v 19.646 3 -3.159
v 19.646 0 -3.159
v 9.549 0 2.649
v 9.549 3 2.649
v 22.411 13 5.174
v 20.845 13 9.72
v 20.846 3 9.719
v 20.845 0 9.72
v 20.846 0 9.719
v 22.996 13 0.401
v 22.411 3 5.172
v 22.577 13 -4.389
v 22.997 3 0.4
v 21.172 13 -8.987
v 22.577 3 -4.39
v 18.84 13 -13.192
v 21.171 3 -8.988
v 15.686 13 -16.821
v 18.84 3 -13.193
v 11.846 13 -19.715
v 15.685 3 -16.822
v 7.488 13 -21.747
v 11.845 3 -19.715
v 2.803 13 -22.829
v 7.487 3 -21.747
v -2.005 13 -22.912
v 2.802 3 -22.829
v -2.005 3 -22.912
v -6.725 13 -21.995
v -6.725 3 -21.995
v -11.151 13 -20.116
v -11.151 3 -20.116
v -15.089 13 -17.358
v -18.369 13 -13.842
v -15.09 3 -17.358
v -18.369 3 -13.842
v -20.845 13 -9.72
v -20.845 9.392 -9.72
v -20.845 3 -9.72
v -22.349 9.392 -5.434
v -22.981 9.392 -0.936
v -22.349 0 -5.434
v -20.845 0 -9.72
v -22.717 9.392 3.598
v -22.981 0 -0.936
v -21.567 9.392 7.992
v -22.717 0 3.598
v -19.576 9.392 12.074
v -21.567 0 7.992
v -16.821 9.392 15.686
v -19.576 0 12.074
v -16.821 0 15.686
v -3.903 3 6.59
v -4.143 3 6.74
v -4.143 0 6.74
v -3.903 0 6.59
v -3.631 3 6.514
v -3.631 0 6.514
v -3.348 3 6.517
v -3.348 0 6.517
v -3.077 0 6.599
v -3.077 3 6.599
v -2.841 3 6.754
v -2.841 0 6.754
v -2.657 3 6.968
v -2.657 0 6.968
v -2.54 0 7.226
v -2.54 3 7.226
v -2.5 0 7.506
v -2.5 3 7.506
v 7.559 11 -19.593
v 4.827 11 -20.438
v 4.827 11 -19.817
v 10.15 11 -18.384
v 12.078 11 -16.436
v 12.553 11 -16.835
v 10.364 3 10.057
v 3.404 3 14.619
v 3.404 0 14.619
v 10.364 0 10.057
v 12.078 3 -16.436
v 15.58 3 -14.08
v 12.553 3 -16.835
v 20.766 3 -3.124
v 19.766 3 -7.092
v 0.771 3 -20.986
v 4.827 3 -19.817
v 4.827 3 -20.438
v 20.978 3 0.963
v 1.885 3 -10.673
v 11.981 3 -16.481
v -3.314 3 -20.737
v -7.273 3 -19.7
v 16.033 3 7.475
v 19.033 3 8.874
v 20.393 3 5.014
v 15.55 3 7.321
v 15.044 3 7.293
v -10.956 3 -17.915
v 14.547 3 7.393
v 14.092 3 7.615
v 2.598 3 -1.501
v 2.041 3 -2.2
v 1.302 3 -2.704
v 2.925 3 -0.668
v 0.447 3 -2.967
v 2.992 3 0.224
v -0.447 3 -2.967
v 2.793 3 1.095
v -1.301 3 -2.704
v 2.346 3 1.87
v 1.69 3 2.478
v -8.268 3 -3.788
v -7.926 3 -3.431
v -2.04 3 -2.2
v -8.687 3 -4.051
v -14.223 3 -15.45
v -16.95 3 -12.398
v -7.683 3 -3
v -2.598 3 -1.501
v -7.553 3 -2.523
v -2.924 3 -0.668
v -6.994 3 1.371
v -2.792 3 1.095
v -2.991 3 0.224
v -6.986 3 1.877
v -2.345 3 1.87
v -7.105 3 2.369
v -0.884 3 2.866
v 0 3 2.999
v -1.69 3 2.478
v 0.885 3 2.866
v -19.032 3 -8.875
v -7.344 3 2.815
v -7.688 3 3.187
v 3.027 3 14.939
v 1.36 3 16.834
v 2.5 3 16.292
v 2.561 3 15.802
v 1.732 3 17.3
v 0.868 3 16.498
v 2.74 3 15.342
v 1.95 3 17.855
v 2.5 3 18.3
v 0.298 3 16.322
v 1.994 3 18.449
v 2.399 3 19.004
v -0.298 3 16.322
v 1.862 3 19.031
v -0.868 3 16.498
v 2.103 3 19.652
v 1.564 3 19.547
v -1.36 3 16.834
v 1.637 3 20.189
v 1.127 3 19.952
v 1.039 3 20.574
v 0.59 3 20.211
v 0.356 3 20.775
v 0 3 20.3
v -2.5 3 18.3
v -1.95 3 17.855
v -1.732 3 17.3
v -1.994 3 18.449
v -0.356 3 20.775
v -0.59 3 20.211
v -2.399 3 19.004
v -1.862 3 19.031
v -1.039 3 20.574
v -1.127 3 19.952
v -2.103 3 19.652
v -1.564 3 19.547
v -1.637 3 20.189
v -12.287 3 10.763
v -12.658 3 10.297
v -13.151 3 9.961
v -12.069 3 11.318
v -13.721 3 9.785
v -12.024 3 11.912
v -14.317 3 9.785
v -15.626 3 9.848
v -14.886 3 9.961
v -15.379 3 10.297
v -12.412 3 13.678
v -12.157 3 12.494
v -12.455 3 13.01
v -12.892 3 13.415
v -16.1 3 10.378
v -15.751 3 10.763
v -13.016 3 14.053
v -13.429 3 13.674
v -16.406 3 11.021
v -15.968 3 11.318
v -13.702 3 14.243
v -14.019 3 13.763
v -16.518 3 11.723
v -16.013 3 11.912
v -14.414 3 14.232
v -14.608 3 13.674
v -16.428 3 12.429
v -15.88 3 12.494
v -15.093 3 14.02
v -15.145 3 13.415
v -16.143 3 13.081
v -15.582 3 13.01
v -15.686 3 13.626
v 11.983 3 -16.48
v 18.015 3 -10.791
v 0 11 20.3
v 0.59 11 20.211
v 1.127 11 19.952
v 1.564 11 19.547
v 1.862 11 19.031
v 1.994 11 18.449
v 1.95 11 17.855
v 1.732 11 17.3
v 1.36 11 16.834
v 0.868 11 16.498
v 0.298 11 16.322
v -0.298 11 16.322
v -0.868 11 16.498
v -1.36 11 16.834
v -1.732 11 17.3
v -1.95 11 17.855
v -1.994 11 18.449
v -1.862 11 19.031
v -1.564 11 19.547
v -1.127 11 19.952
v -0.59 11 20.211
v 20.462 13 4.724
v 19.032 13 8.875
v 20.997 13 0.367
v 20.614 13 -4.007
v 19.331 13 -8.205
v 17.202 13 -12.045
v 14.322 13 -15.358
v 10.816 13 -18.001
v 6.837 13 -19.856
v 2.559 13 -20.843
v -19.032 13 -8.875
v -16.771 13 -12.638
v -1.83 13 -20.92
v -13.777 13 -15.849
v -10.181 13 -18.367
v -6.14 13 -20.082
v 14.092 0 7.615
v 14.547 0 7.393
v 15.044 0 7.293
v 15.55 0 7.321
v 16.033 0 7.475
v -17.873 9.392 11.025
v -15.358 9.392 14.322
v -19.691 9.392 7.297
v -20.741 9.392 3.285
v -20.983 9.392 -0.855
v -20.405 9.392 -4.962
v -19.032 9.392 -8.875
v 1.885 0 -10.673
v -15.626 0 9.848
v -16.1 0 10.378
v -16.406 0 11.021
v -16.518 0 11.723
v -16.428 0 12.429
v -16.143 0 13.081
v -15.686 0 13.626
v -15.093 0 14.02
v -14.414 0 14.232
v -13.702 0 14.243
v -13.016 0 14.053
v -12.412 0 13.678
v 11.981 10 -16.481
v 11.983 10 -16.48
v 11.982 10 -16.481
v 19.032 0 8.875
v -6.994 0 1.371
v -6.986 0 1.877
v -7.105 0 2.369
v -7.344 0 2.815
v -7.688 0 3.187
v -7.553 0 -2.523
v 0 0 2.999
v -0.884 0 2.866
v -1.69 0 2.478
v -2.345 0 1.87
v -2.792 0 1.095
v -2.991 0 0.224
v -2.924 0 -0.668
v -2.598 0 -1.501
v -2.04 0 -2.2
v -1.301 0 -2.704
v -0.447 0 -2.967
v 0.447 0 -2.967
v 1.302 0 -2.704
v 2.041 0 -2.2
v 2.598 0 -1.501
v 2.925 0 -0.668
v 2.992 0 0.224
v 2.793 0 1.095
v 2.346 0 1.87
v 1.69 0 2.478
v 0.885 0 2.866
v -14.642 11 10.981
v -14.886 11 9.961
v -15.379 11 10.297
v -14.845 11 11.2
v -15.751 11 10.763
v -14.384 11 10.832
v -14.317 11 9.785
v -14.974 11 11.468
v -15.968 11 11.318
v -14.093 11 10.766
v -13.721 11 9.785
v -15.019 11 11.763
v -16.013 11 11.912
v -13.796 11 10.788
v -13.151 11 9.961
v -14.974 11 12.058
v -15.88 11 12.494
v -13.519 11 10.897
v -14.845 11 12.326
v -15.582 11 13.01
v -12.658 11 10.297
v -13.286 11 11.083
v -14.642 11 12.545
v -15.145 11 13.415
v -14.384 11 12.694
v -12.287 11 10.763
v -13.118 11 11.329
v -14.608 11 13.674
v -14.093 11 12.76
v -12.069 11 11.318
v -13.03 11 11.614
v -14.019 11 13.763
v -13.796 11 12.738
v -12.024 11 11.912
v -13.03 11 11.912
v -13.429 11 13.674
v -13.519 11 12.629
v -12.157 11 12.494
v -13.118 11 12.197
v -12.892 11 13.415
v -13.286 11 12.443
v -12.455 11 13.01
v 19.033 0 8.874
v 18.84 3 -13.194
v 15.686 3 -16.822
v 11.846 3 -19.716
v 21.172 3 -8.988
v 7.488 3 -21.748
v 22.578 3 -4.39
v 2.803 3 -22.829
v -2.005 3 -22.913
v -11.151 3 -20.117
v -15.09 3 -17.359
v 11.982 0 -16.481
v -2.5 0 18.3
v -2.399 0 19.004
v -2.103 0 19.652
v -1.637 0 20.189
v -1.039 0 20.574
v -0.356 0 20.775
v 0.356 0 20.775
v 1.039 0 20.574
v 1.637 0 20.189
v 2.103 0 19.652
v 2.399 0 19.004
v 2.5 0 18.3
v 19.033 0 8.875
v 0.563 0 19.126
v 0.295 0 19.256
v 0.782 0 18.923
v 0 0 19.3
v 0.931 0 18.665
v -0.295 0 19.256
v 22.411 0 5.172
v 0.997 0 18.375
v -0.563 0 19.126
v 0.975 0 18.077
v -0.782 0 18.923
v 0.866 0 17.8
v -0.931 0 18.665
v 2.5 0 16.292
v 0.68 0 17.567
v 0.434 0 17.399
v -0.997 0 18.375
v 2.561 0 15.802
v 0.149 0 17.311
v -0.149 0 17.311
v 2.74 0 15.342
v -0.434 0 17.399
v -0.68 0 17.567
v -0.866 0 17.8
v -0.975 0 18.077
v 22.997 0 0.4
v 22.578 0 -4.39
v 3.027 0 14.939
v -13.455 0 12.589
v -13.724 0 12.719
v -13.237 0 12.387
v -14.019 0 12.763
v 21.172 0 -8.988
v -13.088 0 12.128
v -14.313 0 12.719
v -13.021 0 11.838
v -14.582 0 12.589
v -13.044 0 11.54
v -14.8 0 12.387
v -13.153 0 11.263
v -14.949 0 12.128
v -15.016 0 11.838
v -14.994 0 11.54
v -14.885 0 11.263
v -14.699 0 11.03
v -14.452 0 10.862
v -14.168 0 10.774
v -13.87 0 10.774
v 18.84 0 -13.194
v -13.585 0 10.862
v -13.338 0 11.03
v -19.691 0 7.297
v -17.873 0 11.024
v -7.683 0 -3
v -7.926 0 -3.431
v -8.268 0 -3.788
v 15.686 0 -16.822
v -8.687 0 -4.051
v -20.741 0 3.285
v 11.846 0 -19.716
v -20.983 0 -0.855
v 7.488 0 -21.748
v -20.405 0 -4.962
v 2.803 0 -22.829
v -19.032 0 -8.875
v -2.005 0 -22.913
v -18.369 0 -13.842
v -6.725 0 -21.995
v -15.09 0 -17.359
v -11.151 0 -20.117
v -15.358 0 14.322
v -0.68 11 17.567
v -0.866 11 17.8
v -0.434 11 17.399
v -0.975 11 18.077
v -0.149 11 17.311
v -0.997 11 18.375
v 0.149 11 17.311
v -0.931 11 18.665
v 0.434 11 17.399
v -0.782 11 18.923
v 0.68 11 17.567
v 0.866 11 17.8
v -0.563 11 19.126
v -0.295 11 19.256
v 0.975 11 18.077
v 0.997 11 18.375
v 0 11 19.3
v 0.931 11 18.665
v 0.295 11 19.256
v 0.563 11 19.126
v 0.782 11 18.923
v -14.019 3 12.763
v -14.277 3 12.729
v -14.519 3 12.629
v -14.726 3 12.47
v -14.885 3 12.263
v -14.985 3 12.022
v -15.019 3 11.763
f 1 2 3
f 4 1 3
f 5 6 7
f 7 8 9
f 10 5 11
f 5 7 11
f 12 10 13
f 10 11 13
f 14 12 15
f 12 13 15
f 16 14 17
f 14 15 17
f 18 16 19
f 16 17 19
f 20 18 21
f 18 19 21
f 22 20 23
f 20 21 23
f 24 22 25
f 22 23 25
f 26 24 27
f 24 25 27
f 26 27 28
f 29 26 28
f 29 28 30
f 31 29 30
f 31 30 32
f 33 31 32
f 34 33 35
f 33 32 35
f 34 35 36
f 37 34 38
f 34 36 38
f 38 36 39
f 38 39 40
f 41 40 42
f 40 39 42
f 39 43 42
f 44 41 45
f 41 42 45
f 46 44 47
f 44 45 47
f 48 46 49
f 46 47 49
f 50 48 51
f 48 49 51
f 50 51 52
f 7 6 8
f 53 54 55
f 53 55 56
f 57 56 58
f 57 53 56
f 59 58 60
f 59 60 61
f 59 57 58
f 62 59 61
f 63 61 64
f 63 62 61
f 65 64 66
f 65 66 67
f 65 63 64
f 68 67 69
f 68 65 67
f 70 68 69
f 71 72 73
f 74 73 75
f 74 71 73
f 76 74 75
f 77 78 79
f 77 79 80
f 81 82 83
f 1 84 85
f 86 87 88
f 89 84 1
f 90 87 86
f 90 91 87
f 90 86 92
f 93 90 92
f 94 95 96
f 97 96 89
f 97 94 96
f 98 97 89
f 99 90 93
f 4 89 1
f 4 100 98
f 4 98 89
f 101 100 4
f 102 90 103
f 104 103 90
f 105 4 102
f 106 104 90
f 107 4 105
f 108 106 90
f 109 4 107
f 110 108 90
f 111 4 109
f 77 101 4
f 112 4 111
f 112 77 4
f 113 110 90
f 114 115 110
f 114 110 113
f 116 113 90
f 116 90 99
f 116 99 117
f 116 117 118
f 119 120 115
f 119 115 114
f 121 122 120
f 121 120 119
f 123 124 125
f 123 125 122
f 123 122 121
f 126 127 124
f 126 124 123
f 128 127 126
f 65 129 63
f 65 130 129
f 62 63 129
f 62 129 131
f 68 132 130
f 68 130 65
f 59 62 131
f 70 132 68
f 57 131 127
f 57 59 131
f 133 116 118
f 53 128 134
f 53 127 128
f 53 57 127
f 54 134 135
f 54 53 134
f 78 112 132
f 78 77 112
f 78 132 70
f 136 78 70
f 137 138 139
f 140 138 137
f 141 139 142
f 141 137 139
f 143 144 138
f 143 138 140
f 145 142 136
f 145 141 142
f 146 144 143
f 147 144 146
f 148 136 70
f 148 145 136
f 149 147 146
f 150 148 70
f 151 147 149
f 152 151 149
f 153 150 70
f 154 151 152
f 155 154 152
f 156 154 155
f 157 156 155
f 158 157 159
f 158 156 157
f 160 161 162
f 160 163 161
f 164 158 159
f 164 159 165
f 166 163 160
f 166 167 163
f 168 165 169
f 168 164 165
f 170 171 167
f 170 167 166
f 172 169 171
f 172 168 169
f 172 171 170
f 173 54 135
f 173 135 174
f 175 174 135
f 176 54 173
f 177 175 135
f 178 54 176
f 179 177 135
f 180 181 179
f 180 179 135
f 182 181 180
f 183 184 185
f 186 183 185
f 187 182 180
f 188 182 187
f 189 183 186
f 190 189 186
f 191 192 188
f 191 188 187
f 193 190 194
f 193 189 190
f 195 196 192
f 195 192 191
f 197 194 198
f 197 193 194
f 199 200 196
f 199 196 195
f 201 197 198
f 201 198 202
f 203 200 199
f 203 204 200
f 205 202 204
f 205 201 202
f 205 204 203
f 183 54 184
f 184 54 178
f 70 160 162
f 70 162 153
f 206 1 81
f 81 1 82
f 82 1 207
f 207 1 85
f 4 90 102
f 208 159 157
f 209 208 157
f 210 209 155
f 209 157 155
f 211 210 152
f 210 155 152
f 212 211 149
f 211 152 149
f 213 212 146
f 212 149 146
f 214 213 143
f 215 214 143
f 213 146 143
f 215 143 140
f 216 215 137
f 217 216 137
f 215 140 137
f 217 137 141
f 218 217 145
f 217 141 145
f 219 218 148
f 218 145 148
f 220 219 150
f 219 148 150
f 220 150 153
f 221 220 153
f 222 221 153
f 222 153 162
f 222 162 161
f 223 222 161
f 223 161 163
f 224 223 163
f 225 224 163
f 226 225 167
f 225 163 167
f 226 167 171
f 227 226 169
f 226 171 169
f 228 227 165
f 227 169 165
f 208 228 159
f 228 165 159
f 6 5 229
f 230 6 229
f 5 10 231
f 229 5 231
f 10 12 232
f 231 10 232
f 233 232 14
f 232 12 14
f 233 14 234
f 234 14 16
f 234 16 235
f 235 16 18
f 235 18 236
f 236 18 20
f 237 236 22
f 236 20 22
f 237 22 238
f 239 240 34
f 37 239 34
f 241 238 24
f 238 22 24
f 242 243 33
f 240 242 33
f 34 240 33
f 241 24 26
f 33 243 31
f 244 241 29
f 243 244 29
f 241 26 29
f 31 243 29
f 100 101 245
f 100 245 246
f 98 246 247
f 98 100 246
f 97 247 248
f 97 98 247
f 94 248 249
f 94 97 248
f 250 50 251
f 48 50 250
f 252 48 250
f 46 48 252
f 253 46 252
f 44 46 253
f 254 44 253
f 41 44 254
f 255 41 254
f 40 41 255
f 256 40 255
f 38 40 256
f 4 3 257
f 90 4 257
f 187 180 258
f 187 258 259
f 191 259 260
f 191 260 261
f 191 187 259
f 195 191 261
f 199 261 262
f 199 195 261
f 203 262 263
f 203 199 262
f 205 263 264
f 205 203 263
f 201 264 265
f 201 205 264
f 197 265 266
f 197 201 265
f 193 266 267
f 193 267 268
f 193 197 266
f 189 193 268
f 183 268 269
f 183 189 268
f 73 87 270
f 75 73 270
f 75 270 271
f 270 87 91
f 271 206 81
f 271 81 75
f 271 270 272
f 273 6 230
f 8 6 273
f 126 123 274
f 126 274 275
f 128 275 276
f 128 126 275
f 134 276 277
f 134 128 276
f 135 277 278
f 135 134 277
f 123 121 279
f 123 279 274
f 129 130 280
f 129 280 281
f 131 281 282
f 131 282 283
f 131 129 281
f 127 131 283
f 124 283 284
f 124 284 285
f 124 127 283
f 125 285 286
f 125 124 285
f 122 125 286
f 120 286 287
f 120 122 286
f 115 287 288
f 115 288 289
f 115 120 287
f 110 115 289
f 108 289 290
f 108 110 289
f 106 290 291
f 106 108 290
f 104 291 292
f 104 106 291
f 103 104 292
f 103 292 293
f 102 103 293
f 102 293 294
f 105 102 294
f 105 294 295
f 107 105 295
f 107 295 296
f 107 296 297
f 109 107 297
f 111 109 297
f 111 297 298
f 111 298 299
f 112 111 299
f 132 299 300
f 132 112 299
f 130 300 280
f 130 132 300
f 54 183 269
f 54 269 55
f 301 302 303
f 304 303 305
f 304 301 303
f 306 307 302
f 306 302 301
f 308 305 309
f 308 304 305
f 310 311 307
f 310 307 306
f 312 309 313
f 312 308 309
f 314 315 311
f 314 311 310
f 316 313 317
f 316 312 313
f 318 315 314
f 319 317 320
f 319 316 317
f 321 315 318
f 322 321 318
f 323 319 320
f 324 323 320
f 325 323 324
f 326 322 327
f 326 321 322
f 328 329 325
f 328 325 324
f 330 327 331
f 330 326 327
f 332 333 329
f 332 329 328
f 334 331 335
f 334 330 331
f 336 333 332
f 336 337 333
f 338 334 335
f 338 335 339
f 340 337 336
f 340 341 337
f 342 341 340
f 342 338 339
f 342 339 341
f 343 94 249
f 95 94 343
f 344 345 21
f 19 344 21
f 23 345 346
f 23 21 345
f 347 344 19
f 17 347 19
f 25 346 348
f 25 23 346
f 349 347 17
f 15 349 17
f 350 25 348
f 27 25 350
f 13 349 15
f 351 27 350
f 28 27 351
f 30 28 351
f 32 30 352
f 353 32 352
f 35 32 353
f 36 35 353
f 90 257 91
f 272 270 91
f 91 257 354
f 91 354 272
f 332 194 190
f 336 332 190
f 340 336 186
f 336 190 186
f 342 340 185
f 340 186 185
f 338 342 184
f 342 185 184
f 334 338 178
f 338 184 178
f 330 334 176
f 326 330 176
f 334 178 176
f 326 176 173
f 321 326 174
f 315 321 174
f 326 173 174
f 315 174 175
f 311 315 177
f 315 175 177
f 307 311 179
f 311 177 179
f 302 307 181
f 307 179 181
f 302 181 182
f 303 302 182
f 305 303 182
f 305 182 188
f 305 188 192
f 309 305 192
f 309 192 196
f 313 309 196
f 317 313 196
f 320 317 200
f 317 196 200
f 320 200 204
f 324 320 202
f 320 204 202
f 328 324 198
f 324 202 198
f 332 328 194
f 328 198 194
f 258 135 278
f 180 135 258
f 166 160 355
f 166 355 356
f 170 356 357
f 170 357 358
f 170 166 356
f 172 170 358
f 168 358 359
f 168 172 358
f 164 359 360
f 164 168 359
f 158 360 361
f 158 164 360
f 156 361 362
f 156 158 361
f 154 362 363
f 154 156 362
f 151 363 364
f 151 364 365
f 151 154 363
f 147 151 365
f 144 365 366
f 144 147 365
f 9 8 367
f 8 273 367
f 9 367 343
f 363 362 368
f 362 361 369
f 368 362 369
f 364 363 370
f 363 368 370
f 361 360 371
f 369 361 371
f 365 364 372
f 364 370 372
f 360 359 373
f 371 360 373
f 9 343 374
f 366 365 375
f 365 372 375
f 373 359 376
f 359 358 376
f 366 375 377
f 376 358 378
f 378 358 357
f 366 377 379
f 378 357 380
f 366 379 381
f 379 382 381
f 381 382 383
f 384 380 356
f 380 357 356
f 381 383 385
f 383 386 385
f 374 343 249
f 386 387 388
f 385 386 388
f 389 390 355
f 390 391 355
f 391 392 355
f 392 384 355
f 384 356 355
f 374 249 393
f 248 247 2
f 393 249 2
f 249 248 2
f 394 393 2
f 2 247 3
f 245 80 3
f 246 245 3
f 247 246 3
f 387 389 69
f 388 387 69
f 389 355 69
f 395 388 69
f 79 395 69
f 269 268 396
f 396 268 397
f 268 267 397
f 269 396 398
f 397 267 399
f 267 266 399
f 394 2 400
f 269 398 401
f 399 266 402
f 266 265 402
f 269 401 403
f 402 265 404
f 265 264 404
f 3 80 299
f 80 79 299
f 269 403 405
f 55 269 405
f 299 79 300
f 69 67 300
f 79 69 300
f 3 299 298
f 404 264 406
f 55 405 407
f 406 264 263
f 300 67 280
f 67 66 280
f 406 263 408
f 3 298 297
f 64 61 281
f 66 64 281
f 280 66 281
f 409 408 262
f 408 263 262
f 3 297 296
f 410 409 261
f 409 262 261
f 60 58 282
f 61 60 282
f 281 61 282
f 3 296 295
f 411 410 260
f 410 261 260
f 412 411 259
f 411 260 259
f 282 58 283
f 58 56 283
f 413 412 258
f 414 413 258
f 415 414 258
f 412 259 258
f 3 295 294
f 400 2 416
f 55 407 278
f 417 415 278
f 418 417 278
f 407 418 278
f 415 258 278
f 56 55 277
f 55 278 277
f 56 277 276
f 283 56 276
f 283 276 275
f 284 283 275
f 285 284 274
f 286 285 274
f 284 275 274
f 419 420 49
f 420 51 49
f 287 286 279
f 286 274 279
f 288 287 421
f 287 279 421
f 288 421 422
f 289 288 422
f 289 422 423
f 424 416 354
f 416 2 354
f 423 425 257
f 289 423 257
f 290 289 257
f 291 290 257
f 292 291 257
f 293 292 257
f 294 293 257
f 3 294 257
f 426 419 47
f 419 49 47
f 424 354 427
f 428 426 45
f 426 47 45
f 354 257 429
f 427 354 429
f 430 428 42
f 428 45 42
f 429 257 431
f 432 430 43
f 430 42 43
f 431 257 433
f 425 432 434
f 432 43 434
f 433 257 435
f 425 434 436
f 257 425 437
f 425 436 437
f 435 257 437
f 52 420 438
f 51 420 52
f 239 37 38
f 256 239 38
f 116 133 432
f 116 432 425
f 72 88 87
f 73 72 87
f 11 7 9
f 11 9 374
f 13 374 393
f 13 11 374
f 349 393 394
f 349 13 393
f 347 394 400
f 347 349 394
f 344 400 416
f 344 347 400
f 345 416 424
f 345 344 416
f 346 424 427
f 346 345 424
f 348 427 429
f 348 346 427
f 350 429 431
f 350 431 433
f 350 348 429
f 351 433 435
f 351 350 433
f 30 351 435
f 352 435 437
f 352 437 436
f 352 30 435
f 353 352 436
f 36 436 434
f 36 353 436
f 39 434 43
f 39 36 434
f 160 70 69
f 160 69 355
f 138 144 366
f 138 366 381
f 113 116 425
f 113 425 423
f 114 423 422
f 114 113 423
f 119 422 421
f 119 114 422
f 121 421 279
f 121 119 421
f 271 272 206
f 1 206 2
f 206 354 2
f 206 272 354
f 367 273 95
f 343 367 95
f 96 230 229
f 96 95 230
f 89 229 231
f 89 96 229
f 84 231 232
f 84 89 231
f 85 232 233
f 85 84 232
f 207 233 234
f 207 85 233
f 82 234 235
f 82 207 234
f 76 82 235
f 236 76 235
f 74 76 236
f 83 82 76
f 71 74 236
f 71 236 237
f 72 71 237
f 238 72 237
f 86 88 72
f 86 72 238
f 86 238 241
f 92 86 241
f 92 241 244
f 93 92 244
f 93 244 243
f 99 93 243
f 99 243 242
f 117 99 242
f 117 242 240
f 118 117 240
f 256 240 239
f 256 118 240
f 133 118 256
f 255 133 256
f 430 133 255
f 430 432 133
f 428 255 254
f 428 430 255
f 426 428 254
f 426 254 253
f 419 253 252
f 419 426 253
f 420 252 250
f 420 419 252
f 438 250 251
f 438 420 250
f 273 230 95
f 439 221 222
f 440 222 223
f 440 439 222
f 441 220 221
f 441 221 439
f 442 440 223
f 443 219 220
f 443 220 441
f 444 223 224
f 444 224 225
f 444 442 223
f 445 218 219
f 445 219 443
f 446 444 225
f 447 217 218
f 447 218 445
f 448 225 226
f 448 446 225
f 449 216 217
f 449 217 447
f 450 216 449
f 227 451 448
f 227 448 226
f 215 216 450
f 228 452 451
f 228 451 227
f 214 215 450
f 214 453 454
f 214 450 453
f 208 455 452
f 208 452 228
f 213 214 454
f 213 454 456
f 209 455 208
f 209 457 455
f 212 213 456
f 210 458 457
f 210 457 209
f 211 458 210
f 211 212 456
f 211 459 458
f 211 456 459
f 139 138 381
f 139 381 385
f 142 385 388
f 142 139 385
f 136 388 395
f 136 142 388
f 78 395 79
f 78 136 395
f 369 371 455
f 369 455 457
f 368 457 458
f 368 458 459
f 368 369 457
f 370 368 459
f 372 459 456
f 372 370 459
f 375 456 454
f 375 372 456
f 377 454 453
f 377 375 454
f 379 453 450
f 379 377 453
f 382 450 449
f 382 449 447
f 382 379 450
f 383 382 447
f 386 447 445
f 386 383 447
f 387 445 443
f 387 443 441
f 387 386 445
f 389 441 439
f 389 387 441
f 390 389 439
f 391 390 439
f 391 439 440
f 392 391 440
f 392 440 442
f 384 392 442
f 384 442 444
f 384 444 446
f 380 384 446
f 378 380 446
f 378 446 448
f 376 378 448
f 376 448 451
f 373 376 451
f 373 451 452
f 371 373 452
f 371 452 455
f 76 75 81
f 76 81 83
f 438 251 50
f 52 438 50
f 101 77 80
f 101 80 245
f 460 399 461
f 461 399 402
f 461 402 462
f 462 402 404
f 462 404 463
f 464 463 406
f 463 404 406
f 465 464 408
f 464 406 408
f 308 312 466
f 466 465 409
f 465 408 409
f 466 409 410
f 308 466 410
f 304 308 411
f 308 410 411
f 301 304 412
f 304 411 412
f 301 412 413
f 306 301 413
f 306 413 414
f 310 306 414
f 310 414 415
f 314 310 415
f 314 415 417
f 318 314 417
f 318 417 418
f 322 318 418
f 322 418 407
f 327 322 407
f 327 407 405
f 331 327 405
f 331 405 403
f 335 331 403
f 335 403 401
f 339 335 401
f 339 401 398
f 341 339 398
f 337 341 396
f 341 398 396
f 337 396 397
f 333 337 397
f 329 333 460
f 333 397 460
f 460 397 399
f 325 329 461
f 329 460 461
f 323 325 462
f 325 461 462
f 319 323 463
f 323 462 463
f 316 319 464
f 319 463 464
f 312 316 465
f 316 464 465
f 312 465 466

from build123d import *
from build123d.topology import SkipClean

# Parameters (mm, degrees)
SKETCH_1_W          = 10
SKETCH_1_H          = 2
REVOLVE_1_ANGLE     = 180
SKETCH_2_R          = 3
EXTRUDE_1_DEPTH     = 3
SKETCH_3_R          = 2
EXTRUDE_2_DEPTH     = 8
SKETCH_4_R          = 2
EXTRUDE_3_DEPTH     = 8
HOLE_WIZARD_1_D     = 2
HOLE_WIZARD_1_DEPTH = 8
RIB_START           = 3
RIB_1_DEPTH         = 8
SKETCH_8_R          = 1
CUT_EXTRUDE_1_DEPTH = 10
CUT_EXTRUDE_START   = -11
SKETCH_9_R          = 1
CUT_EXTRUDE_2_DEPTH = 11
SKETCH_10_W         = 2
SKETCH_10_H         = 9.392270145
SKETCH_11_W         = 2
SKETCH_11_H         = 9.392270145
CUT_REVOLVE_2_ANGLE = 112
CUT_EXTRUDE_4_DEPTH = 10


# Read off the part's stored shape, not the designer's step: 筋1
with BuildPart() as part:
    # 草图1 → 旋转1 (revolve)
    with BuildSketch(Plane(origin=(0, 0, 0), x_dir=(0, -1, 0), z_dir=(-0.422618261740697, 0, 0.9063077870366512))):
        with Locations((-8, 22)):
            Rectangle(SKETCH_1_W, SKETCH_1_H)
    revolve(axis=Axis((0, 13, 0), (0, 1, 0)), revolution_arc=REVOLVE_1_ANGLE)

    # 草图2 → 凸台-拉伸1 (add)
    with BuildSketch(Plane.XZ.offset(-3)):
        with BuildLine():
            Line((-7.687738047, 3.187259937), (-15.625582333, 9.847902149))
            ThreePointArc((-15.625582333, 9.847902149), (-15.933724417, 13.369982281), (-12.411644285, 13.678124365))
            Line((-12.411644285, 13.678124365), (-4.14278761, 6.739729779))
            ThreePointArc((-4.14278761, 6.739729779), (-3.077381738, 6.599466435), (-2.5, 7.505774222))
            Line((-2.5, 7.505774222), (-2.5, 18.3))
            ThreePointArc((-2.5, 18.3), (0, 20.8), (2.5, 18.3))
            Line((2.5, 18.3), (2.5, 16.292228073))
            ThreePointArc((2.5, 16.292228073), (2.740367594, 15.341599967), (3.403693795, 14.619472052))
            Line((3.403693795, 14.619472052), (10.364457725, 10.057462653))
            Line((10.364457725, 10.057462653), (14.091579804, 7.614747152))
            ThreePointArc((14.091579804, 7.614747152), (15.044154935, 7.292674514), (16.033062771, 7.474859732))
            Line((16.033062771, 7.474859732), (20.071872558, 9.358025555))
            Line((20.071872558, 9.358025555), (20.845720003, 9.718845484))
            ThreePointArc((20.845720003, 9.718845484), (9.719853203, -20.84608682), (-20.845079102, -9.72022002))
            Line((-20.845079102, -9.72022002), (-8.687048035, -4.051325027))
            ThreePointArc((-8.687048035, -4.051325027), (-7.926279341, -3.430713127), (-7.552514649, -2.522843041))
            Line((-7.552514649, -2.522843041), (-6.993603119, 1.371009596))
            ThreePointArc((-6.993603119, 1.371009596), (-7.105101968, 2.369164428), (-7.687738047, 3.187259937))
        make_face()
        with Locations(Location((0.000320451, -0.000687268, 0), (0, 0, 90))):
            Circle(SKETCH_2_R, mode=Mode.SUBTRACT)
    extrude(amount=EXTRUDE_1_DEPTH)

    # 草图3 → 凸台-拉伸2 (add)
    with BuildSketch(Plane(origin=(0, 3, 0), x_dir=(-1, 0, 0), z_dir=(0, 1, 0))):
        with Locations(Location((14.018613309, 11.763013257, 0), (0, 0, 90))):
            Circle(SKETCH_3_R)
    extrude(amount=EXTRUDE_2_DEPTH)

    # 草图4 → 凸台-拉伸3 (add)
    with BuildSketch(Plane(origin=(0, 3, 0), x_dir=(-1, 0, 0), z_dir=(0, 1, 0))):
        with Locations(Location((0, 18.3, 0), (0, 0, 90))):
            Circle(SKETCH_4_R)
    extrude(amount=EXTRUDE_3_DEPTH)

    # 孔1
    with Locations(Plane(origin=(0, 11, 0), x_dir=(1, 0, 0), z_dir=(0, 1, 0))):
        with Locations((0, -18.3), (-14.018613309, -11.763013257)):
            Hole(HOLE_WIZARD_1_D / 2, depth=HOLE_WIZARD_1_DEPTH)

    # 筋1 outline → 筋1 (add)
    with BuildSketch(Plane(origin=(0, 0, 0), x_dir=(1, 0, 0), z_dir=(0, 1, 0)).offset(RIB_START)):
        with BuildLine():
            ThreePointArc((12.553349452, 16.834886918), (8.874983497, 19.032463528), (4.827134087, 20.437680312))
            Line((4.827134087, 20.437680312), (4.827134087, 19.816628788))
            Line((4.827134087, 19.816628788), (12.077596383, 16.435682694))
            Line((12.077596383, 16.435682694), (12.553349452, 16.834886918))
        make_face()
    extrude(amount=RIB_1_DEPTH)

    # 草图8 → 切除-拉伸1 (cut)
    with BuildSketch(Plane.XZ):
        with Locations(Location((-14.018613309, 11.763013257, 0), (0, 0, 90))):
            Circle(SKETCH_8_R)
    extrude(amount=-CUT_EXTRUDE_1_DEPTH, mode=Mode.SUBTRACT)

    # 草图9 → 切除-拉伸2 (cut)
    with BuildSketch(Plane(origin=(0, 11, 0), x_dir=(1, 0, 0), z_dir=(0, 1, 0)).offset(CUT_EXTRUDE_START)):
        with Locations(Location((0, -18.3, 0), (0, 0, 270))):
            Circle(SKETCH_9_R)
    extrude(amount=CUT_EXTRUDE_2_DEPTH, mode=Mode.SUBTRACT)

    # 草图10 → 旋转15 (revolve)
    with SkipClean():  # the faces are left unmerged after this step: merging them gives an invalid solid
        with BuildSketch(Plane(origin=(0, 0, 0), x_dir=(0.9063077870366516, 0, 0.4226182617406962), z_dir=(-0.4226182617406962, 0, 0.9063077870366516)), mode=Mode.PRIVATE) as revolve_15_sk:
            with Locations((-22, 4.696135073)):
                Rectangle(SKETCH_10_W, SKETCH_10_H)
        revolve(revolve_15_sk.sketch.rotate(Axis((0, 0, 0), (0, 1, 0)), 281.710962798), axis=Axis((0, 0, 0), (0, 1, 0)))

    # 草图11 → 切除-旋转2 (revolve, cut)
    with BuildSketch(Plane(origin=(0, 0, 0), x_dir=(0.9063077870366513, 0, 0.42261826174069694), z_dir=(-0.42261826174069694, 0, 0.9063077870366513))):
        with Locations((22, 4.696135073)):
            Rectangle(SKETCH_11_W, SKETCH_11_H)
    revolve(axis=Axis((0, 0, 0), (0, -1, 0)), revolution_arc=CUT_REVOLVE_2_ANGLE, mode=Mode.SUBTRACT)

    # 草图12 → 切除-拉伸4 (cut)
    with BuildSketch(Plane.XZ):
        Polygon((9.548814336, 2.649444135), (1.884926874, -10.672654147), (11.982316999, -16.481443418), (19.646204461, -3.159345136), align=None)
    extrude(amount=-CUT_EXTRUDE_4_DEPTH, mode=Mode.SUBTRACT)


solid = part.part
